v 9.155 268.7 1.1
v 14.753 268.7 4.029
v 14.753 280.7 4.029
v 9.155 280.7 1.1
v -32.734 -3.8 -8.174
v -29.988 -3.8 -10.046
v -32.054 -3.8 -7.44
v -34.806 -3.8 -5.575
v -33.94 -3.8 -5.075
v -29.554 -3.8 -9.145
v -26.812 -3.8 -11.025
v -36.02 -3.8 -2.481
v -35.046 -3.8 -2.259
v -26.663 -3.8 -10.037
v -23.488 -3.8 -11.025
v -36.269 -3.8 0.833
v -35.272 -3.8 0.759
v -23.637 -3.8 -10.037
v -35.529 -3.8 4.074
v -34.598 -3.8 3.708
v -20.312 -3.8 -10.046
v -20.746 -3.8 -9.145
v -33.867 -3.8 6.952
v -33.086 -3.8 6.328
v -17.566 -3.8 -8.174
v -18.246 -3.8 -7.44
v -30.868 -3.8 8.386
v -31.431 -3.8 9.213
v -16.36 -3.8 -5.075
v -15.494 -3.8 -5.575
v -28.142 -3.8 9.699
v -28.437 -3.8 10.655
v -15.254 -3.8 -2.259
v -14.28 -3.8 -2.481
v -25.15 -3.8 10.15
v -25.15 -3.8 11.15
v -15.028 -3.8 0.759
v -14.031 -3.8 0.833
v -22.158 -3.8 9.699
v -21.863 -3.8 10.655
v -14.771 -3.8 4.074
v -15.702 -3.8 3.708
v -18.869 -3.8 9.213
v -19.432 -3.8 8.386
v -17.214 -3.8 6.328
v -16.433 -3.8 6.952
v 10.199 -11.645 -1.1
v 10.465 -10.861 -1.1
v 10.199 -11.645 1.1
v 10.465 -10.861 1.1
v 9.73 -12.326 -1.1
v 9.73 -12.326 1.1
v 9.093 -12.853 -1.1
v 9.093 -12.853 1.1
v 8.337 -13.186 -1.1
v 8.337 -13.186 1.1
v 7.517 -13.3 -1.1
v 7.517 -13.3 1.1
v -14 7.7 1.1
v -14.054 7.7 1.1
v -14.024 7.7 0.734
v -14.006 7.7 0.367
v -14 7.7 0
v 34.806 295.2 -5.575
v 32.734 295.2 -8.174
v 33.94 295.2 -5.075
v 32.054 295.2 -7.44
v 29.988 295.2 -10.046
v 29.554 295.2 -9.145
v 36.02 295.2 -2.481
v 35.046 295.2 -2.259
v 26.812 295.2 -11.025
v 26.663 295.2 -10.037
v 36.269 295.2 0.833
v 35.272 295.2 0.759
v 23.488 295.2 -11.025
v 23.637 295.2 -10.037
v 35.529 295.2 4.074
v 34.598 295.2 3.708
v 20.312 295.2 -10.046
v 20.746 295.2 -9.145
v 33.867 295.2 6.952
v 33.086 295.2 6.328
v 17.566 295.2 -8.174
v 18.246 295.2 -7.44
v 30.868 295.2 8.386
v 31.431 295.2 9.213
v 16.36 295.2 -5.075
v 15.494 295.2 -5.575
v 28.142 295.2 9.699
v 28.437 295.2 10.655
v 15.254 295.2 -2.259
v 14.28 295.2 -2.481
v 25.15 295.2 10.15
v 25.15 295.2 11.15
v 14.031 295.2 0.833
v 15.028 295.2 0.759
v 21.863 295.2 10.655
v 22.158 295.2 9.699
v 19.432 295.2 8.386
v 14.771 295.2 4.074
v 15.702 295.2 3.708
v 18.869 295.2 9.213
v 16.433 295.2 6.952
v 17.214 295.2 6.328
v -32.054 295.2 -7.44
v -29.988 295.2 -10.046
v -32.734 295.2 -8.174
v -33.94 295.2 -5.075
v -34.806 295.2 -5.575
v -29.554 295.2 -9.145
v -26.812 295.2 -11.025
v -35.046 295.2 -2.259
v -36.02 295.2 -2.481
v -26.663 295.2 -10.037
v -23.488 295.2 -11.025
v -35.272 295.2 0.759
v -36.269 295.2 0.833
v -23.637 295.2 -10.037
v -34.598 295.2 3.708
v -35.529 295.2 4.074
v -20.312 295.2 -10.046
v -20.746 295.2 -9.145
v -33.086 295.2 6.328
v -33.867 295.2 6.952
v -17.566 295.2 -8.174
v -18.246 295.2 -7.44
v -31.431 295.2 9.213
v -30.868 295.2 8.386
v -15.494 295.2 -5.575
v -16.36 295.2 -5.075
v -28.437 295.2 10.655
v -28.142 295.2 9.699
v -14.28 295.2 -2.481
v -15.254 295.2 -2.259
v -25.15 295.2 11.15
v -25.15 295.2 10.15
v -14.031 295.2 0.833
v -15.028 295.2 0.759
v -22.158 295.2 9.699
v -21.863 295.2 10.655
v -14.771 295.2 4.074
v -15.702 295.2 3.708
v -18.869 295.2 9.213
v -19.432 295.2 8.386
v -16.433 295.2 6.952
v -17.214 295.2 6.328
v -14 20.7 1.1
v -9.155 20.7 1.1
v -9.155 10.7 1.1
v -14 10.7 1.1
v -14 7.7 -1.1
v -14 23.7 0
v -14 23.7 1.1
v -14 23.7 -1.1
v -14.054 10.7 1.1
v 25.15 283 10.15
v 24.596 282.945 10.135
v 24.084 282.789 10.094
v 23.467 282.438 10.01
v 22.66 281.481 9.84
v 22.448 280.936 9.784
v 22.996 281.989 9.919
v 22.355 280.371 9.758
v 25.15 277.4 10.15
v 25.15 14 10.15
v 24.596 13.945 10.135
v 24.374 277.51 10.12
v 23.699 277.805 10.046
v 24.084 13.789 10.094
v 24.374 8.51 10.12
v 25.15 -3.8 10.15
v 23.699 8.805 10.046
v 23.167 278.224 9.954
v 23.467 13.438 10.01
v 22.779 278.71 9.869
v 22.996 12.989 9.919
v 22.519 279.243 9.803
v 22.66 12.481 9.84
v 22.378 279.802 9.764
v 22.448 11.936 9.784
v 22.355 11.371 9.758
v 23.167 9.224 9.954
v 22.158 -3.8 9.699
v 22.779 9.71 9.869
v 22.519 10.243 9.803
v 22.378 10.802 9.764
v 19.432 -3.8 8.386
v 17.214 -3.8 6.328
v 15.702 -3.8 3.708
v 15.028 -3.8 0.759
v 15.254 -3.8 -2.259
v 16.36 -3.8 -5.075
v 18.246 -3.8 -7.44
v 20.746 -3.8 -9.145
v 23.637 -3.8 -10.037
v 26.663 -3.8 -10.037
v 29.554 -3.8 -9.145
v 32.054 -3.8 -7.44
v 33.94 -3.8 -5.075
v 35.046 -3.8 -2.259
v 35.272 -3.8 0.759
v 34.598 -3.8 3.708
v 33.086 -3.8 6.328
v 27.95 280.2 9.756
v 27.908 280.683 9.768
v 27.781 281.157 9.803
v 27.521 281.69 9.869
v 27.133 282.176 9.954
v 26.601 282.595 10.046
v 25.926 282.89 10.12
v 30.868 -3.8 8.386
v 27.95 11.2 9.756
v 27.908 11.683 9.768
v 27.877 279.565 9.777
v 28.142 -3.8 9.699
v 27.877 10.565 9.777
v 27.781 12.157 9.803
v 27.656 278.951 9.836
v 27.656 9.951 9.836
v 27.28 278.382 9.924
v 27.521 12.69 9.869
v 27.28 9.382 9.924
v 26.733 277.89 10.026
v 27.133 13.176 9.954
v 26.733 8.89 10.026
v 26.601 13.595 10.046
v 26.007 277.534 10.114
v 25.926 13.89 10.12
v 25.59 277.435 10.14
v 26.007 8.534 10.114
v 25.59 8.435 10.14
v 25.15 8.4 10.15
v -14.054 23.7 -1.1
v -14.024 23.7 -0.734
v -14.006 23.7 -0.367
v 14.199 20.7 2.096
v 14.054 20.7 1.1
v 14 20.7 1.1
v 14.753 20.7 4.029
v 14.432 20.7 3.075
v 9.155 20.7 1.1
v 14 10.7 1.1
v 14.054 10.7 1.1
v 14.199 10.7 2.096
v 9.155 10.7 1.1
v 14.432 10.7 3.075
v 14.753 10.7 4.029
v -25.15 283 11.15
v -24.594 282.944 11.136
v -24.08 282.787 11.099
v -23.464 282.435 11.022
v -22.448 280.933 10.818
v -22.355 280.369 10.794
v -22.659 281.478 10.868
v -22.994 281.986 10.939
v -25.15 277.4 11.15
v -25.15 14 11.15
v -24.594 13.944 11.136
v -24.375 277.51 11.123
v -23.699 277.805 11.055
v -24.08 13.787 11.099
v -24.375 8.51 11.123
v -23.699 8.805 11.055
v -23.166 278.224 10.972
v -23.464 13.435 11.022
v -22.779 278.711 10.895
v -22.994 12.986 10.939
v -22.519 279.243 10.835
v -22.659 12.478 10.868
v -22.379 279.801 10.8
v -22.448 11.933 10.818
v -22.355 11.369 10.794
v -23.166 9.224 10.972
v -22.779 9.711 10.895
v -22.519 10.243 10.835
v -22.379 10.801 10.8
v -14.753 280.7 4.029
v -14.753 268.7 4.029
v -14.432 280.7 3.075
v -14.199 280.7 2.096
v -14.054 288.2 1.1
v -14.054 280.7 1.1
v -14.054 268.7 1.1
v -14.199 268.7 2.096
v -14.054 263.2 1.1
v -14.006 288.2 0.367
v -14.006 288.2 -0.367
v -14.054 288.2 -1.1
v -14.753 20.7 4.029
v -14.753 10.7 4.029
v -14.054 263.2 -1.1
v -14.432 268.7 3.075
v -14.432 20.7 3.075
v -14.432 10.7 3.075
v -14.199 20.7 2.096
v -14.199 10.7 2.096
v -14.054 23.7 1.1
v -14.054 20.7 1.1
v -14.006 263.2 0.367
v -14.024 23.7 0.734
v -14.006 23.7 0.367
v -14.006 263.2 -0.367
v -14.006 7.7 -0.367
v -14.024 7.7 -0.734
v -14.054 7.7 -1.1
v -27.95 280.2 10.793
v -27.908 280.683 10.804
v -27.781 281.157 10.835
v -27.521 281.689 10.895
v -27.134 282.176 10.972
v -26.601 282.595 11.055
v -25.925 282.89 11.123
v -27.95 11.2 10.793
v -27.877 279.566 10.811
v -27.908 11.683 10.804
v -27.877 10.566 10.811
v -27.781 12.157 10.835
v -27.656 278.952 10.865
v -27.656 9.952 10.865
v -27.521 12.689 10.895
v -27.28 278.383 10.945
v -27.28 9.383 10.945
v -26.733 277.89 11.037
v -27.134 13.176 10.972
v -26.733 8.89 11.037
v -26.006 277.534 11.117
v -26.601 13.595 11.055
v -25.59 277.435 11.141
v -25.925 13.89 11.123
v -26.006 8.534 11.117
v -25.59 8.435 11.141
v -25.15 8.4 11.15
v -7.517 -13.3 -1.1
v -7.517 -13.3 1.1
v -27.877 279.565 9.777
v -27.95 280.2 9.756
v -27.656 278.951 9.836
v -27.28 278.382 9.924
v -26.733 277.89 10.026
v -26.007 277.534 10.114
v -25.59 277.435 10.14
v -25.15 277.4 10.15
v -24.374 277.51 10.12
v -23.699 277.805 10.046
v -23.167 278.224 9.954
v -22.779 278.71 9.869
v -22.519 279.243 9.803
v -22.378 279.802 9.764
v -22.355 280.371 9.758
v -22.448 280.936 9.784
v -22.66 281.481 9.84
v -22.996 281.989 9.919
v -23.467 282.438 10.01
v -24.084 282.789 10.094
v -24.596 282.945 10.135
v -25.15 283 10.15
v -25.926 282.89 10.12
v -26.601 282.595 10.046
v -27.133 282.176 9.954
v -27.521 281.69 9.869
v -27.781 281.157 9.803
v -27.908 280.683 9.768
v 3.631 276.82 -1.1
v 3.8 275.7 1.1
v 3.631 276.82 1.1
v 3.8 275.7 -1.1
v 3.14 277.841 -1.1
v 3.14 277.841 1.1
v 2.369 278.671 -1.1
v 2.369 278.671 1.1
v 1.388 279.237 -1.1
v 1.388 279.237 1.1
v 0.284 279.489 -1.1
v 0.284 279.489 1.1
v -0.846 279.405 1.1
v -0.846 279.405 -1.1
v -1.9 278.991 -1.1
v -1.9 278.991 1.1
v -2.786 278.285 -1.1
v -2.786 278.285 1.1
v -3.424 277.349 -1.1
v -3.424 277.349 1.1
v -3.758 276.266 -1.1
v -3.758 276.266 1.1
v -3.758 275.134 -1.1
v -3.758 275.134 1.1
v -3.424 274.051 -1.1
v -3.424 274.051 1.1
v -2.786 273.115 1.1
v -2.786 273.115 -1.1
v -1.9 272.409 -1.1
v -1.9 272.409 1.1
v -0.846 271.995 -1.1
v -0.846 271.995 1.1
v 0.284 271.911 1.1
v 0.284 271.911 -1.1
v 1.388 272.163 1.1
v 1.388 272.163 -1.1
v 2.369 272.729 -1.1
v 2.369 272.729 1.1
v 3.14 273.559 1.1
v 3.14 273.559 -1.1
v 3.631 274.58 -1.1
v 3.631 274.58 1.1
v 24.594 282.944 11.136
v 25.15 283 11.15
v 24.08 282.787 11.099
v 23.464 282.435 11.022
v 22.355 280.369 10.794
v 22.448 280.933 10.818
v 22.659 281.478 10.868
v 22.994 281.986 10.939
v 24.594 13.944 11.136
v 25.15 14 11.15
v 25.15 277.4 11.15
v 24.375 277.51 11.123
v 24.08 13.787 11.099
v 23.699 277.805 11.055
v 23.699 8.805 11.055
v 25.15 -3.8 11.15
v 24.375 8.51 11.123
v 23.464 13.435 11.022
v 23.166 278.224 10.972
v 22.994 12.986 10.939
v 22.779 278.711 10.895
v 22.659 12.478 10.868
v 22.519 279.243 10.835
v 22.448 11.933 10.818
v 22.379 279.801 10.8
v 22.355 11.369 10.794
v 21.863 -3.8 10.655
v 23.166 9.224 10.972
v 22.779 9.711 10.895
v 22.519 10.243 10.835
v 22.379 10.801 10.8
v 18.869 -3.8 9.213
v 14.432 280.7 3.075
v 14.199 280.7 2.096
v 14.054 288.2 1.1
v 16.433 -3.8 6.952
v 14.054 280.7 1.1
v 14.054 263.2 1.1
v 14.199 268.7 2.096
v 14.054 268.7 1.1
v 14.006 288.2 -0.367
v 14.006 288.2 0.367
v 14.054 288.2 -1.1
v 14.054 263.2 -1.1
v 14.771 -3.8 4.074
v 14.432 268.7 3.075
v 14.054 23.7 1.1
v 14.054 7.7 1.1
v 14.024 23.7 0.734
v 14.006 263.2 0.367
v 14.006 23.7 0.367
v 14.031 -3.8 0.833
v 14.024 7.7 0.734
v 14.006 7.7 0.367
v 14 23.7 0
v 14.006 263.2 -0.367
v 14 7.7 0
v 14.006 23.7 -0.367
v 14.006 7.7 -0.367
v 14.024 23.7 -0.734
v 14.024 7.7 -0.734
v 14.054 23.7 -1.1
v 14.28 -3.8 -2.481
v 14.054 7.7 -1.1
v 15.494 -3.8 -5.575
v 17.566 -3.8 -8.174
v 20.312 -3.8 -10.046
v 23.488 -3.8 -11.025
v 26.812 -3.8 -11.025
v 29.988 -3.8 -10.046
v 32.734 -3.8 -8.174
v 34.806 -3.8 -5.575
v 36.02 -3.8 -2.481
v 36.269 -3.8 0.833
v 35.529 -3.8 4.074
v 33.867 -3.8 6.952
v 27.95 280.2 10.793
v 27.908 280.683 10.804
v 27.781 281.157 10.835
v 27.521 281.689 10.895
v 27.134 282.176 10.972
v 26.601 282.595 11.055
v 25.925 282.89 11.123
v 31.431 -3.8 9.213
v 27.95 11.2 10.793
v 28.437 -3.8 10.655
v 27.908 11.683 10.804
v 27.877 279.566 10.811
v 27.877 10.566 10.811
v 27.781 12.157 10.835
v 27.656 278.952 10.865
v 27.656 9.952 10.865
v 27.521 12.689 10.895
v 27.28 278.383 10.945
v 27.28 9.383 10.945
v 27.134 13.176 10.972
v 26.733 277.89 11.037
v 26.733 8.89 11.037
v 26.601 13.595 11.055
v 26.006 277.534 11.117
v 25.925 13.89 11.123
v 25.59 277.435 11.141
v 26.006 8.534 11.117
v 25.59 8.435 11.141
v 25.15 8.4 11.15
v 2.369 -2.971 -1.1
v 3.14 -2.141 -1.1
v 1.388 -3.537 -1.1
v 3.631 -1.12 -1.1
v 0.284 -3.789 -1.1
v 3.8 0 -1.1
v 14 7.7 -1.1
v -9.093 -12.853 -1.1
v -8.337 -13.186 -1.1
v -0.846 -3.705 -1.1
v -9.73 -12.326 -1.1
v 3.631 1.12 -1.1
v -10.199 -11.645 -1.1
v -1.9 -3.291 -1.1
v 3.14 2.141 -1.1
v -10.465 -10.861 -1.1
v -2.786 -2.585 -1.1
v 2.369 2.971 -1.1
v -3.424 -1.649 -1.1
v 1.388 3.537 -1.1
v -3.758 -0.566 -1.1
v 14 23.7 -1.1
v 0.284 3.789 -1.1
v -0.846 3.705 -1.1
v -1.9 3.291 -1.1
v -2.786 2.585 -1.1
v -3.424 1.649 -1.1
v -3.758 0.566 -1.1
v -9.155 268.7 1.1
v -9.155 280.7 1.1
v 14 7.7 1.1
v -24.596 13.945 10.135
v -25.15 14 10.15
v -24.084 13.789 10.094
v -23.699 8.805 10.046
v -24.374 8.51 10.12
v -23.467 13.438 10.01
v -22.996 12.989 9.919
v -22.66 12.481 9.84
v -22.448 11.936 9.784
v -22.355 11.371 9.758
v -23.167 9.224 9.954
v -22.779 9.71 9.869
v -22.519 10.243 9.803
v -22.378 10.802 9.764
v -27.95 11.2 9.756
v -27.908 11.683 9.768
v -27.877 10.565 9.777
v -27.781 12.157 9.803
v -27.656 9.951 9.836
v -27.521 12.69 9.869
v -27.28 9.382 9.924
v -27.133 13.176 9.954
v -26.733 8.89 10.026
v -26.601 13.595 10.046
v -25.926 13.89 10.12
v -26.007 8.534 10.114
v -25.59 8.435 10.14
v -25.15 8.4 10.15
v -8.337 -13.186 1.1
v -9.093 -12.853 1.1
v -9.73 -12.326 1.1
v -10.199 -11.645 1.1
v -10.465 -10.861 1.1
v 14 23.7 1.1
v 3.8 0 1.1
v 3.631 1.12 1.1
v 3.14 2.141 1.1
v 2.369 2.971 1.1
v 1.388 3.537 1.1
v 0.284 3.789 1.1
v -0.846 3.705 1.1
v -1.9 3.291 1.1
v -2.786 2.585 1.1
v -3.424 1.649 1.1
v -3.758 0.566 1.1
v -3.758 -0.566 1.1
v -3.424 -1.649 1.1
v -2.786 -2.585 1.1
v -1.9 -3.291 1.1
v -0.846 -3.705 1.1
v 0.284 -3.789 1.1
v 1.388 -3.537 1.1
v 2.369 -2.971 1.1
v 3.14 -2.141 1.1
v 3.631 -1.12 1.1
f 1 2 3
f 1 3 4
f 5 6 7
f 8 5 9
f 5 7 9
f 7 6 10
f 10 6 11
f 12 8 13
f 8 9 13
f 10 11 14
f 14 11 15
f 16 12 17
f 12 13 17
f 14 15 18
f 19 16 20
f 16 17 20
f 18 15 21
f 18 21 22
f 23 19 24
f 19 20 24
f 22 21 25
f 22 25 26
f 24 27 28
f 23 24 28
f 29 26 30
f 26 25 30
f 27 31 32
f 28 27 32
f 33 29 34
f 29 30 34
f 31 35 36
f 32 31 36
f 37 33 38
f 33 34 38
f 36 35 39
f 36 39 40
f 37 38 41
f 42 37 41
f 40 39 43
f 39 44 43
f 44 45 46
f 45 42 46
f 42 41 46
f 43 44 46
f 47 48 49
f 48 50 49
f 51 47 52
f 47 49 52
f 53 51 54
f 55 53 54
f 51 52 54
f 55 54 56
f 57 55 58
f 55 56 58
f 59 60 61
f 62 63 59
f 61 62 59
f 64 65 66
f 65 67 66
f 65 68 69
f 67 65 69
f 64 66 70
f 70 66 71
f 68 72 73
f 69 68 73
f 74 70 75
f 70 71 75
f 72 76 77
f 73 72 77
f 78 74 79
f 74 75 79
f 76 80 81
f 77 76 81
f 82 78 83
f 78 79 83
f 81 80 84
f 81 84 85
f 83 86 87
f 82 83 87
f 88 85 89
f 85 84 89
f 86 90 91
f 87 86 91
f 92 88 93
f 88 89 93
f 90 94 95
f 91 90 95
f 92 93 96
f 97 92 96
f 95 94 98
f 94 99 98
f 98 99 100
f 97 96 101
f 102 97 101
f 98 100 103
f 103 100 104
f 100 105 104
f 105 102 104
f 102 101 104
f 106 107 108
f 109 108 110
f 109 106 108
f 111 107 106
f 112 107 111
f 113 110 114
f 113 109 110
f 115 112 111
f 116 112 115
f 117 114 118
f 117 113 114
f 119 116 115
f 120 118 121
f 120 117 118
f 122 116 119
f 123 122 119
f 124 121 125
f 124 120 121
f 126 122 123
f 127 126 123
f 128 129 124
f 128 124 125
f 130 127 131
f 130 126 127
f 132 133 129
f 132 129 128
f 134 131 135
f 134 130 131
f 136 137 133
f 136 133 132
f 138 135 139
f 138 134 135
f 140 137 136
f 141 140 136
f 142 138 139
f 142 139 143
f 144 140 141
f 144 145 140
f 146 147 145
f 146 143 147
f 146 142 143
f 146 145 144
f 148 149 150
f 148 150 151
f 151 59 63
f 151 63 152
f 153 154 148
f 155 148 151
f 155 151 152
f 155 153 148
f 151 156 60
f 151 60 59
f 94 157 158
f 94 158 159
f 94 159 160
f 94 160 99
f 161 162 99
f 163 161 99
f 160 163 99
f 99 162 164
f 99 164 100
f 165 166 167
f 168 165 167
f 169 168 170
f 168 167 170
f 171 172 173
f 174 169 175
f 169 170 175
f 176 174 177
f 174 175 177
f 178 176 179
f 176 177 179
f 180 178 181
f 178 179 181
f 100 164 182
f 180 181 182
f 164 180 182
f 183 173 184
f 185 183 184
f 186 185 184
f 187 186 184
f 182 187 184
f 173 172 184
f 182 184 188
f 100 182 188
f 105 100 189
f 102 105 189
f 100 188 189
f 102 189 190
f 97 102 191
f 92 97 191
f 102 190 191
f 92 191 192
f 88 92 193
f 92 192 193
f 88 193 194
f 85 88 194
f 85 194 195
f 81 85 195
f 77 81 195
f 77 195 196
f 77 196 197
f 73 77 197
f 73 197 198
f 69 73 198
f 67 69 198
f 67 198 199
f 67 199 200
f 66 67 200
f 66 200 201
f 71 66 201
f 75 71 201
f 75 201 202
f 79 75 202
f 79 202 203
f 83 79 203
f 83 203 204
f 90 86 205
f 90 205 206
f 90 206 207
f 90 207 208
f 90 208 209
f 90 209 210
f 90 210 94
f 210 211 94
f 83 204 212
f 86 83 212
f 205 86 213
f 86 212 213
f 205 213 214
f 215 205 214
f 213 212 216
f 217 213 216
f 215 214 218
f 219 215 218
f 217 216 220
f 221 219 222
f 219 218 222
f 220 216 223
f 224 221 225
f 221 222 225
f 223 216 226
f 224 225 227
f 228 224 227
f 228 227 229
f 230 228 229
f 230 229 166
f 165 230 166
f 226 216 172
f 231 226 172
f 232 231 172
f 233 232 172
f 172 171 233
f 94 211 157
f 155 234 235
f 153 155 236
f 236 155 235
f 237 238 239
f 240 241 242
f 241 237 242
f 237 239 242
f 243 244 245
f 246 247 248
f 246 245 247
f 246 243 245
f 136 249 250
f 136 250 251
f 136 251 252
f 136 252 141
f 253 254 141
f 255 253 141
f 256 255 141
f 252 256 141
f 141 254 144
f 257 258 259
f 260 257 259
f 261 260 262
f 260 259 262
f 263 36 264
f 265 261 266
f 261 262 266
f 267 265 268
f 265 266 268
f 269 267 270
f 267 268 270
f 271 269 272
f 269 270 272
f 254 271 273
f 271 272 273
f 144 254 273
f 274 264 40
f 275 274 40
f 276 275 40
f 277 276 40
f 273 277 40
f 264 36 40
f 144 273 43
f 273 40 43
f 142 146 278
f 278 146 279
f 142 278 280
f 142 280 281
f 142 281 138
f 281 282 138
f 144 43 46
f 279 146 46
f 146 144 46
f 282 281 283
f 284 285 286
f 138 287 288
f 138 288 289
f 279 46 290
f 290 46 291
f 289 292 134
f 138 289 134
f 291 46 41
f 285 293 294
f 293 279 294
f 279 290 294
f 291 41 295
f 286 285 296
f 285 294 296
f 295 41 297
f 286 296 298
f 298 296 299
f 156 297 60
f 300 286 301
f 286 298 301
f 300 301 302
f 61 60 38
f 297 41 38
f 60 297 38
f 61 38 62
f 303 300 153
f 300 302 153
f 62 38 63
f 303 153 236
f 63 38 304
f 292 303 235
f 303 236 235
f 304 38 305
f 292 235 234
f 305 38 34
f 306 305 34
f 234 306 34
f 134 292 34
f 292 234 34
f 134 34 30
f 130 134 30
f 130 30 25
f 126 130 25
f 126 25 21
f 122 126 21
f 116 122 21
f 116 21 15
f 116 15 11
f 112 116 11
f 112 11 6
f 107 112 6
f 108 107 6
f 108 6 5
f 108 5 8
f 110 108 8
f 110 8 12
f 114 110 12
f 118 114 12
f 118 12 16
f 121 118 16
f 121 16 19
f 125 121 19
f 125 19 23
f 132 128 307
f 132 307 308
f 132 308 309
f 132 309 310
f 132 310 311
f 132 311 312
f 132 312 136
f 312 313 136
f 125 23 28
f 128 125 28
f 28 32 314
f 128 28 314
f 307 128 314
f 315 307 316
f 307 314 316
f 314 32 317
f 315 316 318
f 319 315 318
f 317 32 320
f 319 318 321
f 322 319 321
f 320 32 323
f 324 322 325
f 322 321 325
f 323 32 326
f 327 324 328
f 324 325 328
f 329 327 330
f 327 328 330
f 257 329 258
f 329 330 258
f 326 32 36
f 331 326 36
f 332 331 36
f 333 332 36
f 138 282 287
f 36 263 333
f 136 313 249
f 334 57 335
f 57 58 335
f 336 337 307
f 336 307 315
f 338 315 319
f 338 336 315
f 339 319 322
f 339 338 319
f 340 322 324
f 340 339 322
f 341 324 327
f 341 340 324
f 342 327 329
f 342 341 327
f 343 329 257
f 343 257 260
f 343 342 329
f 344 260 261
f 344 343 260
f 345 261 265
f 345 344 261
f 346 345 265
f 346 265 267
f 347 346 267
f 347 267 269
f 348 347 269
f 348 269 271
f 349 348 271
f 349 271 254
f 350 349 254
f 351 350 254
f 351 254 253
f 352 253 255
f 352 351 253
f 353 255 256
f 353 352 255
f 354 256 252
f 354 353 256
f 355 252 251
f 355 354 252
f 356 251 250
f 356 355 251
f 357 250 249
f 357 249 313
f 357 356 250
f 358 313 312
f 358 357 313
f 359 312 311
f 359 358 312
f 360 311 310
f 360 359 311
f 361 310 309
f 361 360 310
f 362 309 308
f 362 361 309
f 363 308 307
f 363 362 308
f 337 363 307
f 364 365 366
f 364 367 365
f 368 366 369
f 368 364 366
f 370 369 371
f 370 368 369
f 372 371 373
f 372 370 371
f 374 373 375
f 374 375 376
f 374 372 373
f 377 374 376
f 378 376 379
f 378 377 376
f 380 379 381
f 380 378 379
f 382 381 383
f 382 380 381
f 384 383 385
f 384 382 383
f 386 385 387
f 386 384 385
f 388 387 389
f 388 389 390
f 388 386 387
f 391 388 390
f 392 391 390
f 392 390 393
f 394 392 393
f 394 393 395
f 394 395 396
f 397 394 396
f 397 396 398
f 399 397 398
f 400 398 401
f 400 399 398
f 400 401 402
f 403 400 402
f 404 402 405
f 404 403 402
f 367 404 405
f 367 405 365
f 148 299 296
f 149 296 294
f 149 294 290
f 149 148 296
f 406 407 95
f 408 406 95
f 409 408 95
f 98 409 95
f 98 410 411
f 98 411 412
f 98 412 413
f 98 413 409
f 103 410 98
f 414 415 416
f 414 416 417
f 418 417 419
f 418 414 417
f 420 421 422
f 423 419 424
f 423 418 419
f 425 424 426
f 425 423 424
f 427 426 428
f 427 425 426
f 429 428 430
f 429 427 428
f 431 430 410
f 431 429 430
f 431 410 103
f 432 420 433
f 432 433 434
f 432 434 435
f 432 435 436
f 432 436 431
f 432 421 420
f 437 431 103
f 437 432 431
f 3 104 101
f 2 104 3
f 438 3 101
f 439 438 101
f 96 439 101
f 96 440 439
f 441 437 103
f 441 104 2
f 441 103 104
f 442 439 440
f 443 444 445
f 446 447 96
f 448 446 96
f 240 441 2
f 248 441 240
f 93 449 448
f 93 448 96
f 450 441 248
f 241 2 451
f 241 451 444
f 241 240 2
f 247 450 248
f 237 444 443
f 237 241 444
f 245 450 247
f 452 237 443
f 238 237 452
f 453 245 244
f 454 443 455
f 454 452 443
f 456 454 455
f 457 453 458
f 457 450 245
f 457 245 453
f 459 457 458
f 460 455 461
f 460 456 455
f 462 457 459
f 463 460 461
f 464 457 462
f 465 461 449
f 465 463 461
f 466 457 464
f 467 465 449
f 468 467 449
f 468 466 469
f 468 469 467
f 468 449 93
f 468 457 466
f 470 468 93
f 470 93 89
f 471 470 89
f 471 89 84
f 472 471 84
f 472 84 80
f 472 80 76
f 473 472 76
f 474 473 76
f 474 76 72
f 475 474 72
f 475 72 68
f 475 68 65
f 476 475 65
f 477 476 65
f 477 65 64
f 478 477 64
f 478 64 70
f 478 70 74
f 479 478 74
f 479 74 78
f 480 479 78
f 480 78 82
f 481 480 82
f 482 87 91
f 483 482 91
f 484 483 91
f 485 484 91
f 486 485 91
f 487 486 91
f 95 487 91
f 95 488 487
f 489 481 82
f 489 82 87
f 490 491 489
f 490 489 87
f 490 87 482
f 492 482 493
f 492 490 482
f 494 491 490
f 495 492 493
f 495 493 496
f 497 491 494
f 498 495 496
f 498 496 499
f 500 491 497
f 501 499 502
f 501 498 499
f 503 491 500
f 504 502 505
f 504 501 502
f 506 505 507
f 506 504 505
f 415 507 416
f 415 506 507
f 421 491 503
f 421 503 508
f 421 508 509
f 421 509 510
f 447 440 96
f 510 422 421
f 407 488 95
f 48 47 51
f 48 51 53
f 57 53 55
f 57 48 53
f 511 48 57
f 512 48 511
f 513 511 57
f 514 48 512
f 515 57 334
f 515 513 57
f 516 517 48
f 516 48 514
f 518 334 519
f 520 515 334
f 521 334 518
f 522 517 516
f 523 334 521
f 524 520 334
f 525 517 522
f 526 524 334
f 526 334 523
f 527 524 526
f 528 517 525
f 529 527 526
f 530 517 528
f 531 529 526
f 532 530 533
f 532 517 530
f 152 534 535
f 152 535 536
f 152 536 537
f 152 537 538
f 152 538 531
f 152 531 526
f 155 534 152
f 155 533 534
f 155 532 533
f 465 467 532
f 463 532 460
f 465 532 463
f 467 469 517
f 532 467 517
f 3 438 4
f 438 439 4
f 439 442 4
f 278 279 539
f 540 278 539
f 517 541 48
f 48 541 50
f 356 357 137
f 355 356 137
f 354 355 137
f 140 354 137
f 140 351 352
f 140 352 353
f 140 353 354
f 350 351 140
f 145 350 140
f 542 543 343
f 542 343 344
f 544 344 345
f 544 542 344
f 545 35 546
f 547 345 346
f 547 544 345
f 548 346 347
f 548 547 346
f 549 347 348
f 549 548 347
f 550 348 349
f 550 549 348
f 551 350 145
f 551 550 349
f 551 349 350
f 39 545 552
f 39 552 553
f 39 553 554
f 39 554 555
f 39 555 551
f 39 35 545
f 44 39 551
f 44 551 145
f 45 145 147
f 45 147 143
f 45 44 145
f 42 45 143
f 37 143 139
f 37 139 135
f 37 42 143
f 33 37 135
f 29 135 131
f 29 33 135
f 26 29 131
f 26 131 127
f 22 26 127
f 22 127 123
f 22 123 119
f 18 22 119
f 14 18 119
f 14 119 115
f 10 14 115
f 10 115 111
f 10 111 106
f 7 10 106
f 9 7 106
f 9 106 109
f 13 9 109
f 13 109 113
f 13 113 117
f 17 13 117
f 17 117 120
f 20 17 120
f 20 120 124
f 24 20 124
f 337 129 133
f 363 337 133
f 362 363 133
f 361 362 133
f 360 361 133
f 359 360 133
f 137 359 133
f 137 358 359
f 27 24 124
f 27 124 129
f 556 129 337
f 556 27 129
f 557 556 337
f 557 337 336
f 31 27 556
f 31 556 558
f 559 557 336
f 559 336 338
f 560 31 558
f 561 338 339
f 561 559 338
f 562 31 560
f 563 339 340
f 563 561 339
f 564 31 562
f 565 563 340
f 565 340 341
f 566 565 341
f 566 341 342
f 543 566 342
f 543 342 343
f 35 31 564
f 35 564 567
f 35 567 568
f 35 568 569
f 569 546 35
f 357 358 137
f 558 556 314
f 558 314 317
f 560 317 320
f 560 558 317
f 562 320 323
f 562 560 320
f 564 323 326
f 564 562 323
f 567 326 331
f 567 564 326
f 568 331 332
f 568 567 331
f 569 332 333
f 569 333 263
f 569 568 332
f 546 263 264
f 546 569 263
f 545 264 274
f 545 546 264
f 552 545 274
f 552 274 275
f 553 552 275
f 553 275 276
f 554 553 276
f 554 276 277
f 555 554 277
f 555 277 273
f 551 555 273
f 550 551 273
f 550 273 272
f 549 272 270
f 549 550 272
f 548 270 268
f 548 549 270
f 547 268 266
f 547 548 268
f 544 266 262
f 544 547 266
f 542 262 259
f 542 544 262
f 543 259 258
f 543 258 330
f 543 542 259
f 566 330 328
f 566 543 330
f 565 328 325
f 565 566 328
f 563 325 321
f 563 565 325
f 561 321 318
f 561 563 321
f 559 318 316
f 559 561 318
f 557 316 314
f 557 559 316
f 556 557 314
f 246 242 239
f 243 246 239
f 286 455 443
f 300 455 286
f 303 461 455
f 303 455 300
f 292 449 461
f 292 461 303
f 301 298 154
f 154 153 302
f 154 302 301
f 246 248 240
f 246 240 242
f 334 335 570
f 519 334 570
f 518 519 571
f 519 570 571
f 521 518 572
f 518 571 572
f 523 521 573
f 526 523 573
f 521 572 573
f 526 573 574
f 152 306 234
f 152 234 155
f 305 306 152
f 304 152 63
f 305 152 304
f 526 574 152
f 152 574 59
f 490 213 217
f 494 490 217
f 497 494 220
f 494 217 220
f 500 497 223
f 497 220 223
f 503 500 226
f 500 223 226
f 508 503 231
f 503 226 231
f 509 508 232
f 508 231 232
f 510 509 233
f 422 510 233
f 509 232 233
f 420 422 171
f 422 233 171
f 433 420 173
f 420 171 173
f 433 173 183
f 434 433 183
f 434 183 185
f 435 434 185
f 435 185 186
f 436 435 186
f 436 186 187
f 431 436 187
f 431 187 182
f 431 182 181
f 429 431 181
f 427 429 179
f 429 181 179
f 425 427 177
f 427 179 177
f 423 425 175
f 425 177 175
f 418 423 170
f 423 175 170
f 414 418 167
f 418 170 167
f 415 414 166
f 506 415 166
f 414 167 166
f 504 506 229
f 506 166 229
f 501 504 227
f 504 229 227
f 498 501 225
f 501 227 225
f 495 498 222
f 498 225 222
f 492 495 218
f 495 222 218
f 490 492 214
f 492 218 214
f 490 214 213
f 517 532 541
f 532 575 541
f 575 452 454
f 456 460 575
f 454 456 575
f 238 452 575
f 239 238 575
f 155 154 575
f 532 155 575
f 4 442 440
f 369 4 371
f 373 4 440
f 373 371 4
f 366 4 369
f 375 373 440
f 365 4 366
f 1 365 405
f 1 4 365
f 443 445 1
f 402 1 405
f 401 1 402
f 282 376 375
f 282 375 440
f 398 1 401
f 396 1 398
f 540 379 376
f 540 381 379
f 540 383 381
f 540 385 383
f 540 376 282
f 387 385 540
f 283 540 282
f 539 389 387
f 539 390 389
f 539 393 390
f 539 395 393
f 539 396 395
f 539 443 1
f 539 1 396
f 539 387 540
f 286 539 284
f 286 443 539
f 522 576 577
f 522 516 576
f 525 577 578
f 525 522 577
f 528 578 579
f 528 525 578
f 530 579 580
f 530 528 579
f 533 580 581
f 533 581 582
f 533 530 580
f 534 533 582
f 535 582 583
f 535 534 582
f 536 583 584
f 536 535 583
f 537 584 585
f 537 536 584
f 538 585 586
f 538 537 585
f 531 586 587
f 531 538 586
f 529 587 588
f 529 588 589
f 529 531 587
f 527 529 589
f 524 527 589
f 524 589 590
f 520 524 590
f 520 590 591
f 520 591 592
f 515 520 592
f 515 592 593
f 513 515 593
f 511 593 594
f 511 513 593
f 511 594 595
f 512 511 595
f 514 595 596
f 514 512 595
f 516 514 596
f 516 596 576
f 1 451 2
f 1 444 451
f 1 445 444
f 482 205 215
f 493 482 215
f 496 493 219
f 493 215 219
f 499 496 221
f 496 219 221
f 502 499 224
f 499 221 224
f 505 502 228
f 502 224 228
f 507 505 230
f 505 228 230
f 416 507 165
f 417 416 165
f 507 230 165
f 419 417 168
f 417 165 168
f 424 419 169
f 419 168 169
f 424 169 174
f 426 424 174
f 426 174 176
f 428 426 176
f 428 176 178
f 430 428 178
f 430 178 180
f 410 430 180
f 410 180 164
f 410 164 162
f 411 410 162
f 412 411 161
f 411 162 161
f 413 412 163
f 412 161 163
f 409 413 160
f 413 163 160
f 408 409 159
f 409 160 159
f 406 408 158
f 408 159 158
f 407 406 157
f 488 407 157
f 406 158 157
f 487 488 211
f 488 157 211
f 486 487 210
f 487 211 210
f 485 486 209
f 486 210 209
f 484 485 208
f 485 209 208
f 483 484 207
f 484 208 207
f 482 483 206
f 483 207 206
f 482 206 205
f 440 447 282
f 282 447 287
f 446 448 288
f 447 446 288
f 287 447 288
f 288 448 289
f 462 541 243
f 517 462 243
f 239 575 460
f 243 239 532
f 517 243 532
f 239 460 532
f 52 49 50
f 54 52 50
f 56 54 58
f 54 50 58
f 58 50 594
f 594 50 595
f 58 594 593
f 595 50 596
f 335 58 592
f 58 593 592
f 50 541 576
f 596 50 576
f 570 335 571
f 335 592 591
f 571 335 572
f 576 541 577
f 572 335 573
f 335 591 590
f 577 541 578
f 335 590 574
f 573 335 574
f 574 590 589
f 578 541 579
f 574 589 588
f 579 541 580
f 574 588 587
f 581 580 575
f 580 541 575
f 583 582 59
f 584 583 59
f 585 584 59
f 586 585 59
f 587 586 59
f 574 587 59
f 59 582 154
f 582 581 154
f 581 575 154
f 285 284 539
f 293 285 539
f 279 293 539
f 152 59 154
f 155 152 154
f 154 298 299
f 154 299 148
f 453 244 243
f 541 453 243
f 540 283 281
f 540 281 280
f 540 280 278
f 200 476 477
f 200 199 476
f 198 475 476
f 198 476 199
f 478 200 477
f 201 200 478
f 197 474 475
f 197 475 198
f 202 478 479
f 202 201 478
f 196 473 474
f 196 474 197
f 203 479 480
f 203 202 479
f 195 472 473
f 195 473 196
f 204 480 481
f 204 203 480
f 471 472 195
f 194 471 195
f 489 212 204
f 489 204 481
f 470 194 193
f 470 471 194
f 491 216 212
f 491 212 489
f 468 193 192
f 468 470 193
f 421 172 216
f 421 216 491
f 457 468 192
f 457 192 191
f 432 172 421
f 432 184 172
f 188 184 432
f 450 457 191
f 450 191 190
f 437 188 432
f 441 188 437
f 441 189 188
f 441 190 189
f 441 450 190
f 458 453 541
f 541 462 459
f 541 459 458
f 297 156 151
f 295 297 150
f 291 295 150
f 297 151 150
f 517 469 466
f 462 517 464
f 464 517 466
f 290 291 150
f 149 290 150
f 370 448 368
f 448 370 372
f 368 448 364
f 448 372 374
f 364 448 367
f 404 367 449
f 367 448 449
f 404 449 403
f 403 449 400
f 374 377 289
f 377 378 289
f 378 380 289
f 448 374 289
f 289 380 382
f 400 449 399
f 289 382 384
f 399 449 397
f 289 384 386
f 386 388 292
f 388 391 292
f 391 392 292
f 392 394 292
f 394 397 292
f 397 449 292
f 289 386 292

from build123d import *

# Parameters (mm, degrees)
SKETCH1_R                = 3.8
BOSS_EXTRUDE1_DEPTH      = 1.1
SKETCH1_W                = 28
SKETCH1_H                = 25
BOSS_EXTRUDE1_2_DEPTH    = 1.1
BOSS_EXTRUDE2_DEPTH      = 295.2
BOSS_EXTRUDE2_DEPTH_BACK = 3.8
SKETCH2_R                = 11.15
SKETCH2_R_2              = 10.15
SKETCH4_W                = 0.054392761
SKETCH4_H                = 2.2
BOSS_EXTRUDE22_DEPTH     = 16
BOSS_EXTRUDE23_START     = 239.5
SKETCH4_5_W              = 0.054392761
SKETCH4_5_H              = 2.2
BOSS_EXTRUDE23_DEPTH     = 25
BOSS_EXTRUDE24_START     = -13
BOSS_EXTRUDE24_DEPTH     = 10
BOSS_EXTRUDE25_START     = 245
BOSS_EXTRUDE25_DEPTH     = 12
CUT_EXTRUDE1_REACH       = 299.632
CUT_EXTRUDE1_END_RADIUS  = 11.15
SKETCH5_R                = 2.8


# Read off the part's stored shape, not the designer's step: Boss-Extrude24, Boss-Extrude25
with BuildPart() as part:
    # Sketch1 → Boss-Extrude1 (new, symmetric)
    with BuildSketch(Plane.XY):
        with BuildLine():
            Line((-14, 23.7), (14, 23.7))
            Line((14, 23.7), (14, 7.7))
            Line((14, 7.7), (10.464507367, -10.861336324))
            ThreePointArc((10.464507367, -10.861336324), (9.430080362, -12.611277674), (7.517491668, -13.3))
            Line((7.517491668, -13.3), (-7.517491668, -13.3))
            ThreePointArc((-7.517491668, -13.3), (-9.430080362, -12.611277674), (-10.464507367, -10.861336324))
            Line((-10.464507367, -10.861336324), (-14, 7.7))
            Line((-14, 7.7), (-14, 23.7))
        make_face()
        Circle(SKETCH1_R, mode=Mode.SUBTRACT)
    extrude(amount=BOSS_EXTRUDE1_DEPTH, both=True)


with BuildPart() as body_2:
    # Sketch1 → Boss-Extrude1 2 (new, symmetric)
    with BuildSketch(Plane.XY):
        with Locations((0, 275.7)):
            Rectangle(SKETCH1_W, SKETCH1_H)
        with Locations((0, 275.7)):
            Circle(SKETCH1_R, mode=Mode.SUBTRACT)
    extrude(amount=BOSS_EXTRUDE1_2_DEPTH, both=True)


with BuildPart() as body_3:
    # Sketch2 → Boss-Extrude2 (new, two sides: drawn at the far end of the back side and taken through both)
    with BuildSketch(Plane(origin=(0, 0, 0), x_dir=(1, 0, 0), z_dir=(0, 1, 0)).offset(-BOSS_EXTRUDE2_DEPTH_BACK)):
        with Locations(Location((-25.15, 0, 0), (0, 0, 270))):
            Circle(SKETCH2_R)
        with Locations(Location((-25.15, 0, 0), (0, 0, 270))):
            Circle(SKETCH2_R_2, mode=Mode.SUBTRACT)
    extrude(amount=BOSS_EXTRUDE2_DEPTH + BOSS_EXTRUDE2_DEPTH_BACK)

    # Cut-Extrude1: up to this cylinder (the profile starts inside it)
    cut_extrude1_end = Plane(origin=(-25.15, 145.7, 0), z_dir=(0, -1, 0)) * Cylinder(CUT_EXTRUDE1_END_RADIUS, 891.564, mode=Mode.PRIVATE)
    # Sketch5 → Cut-Extrude1 (cut, up to the surface)
    with BuildSketch(Plane.XY, mode=Mode.PRIVATE) as cut_extrude1_sk1:
        with Locations(Location((-25.15, 280.2, 0), (0, 0, 180))):
            Circle(SKETCH5_R)
    cut_extrude1_tool1 = extrude(cut_extrude1_sk1.sketch, amount=CUT_EXTRUDE1_REACH, mode=Mode.PRIVATE) & cut_extrude1_end
    add(cut_extrude1_tool1.solids().sort_by_distance((-25.15, 280.2, 0))[0], mode=Mode.SUBTRACT)
    # Sketch5 → Cut-Extrude1 (cut, up to the surface)
    with BuildSketch(Plane.XY, mode=Mode.PRIVATE) as cut_extrude1_sk2:
        with Locations(Location((-25.15, 11.2, 0), (0, 0, 180))):
            Circle(SKETCH5_R)
    cut_extrude1_tool2 = extrude(cut_extrude1_sk2.sketch, amount=CUT_EXTRUDE1_REACH, mode=Mode.PRIVATE) & cut_extrude1_end
    add(cut_extrude1_tool2.solids().sort_by_distance((-25.15, 11.2, 0))[0], mode=Mode.SUBTRACT)


with BuildPart() as body_4:
    # Sketch4 → Boss-Extrude22 (new body)
    with BuildSketch(Plane(origin=(0, 23.7, 0), x_dir=(1, 0, 0), z_dir=(0, 1, 0))):
        with Locations((-14.027196381, 0)):
            Rectangle(SKETCH4_W, SKETCH4_H)
    extrude(amount=-BOSS_EXTRUDE22_DEPTH)


with BuildPart() as body_5:
    # Sketch4<5> → Boss-Extrude23 (new body)
    with BuildSketch(Plane(origin=(0, 23.7, 0), x_dir=(1, 0, 0), z_dir=(0, 1, 0)).offset(BOSS_EXTRUDE23_START)):
        with Locations((-14.027196381, 0)):
            Rectangle(SKETCH4_5_W, SKETCH4_5_H)
    extrude(amount=BOSS_EXTRUDE23_DEPTH)


with BuildPart() as body_6:
    # Boss-Extrude24 outline → Boss-Extrude24 (new body)
    with BuildSketch(Plane(origin=(0, 23.7, 0), x_dir=(1, 0, 0), z_dir=(0, 1, 0)).offset(BOSS_EXTRUDE24_START)):
        with BuildLine():
            ThreePointArc((-14.154887449, -1.1), (-14.416508117, -2.625766935), (-14.888786621, -4.1))
            Line((-14.888786621, -4.1), (-9.154887449, -1.1))
            Line((-9.154887449, -1.1), (-14.154887449, -1.1))
        make_face()
    extrude(amount=BOSS_EXTRUDE24_DEPTH)


with BuildPart() as body_7:
    # Boss-Extrude25 outline → Boss-Extrude25 (new body)
    with BuildSketch(Plane(origin=(0, 23.7, 0), x_dir=(1, 0, 0), z_dir=(0, 1, 0)).offset(BOSS_EXTRUDE25_START)):
        with BuildLine():
            Line((-9.154887449, -1.1), (-14.154887449, -1.1))
            ThreePointArc((-14.154887449, -1.1), (-14.416508117, -2.625766935), (-14.888786621, -4.1))
            Line((-14.888786621, -4.1), (-9.154887449, -1.1))
        make_face()
    extrude(amount=BOSS_EXTRUDE25_DEPTH)


with BuildPart() as body_8:
    # Mirror18: mirrored copy
    add(body_3.part.mirror(Plane(origin=(0, 0, 0), x_dir=(0, 0, 1), z_dir=(1, 0, 0))))


with BuildPart() as body_9:
    # Mirror18 2: mirrored copy
    add(body_4.part.mirror(Plane(origin=(0, 0, 0), x_dir=(0, 0, 1), z_dir=(1, 0, 0))))


with BuildPart() as body_10:
    # Mirror18 3: mirrored copy
    add(body_5.part.mirror(Plane(origin=(0, 0, 0), x_dir=(0, 0, 1), z_dir=(1, 0, 0))))


with BuildPart() as body_11:
    # Mirror18 4: mirrored copy
    add(body_6.part.mirror(Plane(origin=(0, 0, 0), x_dir=(0, 0, 1), z_dir=(1, 0, 0))))


with BuildPart() as body_12:
    # Mirror18 5: mirrored copy
    add(body_7.part.mirror(Plane(origin=(0, 0, 0), x_dir=(0, 0, 1), z_dir=(1, 0, 0))))


with BuildPart() as body_2_1:
    add(body_2.part)

    # Combine2: union body 3, body 4, body 5, body 6, body 7, body 8, body 9, body 10, body 11, body 12
    add(body_3.part)
    add(body_4.part)
    add(body_5.part)
    add(body_6.part)
    add(body_7.part)
    add(body_8.part)
    add(body_9.part)
    add(body_10.part)
    add(body_11.part)
    add(body_12.part)


solid = Compound([part.part, body_2_1.part])
